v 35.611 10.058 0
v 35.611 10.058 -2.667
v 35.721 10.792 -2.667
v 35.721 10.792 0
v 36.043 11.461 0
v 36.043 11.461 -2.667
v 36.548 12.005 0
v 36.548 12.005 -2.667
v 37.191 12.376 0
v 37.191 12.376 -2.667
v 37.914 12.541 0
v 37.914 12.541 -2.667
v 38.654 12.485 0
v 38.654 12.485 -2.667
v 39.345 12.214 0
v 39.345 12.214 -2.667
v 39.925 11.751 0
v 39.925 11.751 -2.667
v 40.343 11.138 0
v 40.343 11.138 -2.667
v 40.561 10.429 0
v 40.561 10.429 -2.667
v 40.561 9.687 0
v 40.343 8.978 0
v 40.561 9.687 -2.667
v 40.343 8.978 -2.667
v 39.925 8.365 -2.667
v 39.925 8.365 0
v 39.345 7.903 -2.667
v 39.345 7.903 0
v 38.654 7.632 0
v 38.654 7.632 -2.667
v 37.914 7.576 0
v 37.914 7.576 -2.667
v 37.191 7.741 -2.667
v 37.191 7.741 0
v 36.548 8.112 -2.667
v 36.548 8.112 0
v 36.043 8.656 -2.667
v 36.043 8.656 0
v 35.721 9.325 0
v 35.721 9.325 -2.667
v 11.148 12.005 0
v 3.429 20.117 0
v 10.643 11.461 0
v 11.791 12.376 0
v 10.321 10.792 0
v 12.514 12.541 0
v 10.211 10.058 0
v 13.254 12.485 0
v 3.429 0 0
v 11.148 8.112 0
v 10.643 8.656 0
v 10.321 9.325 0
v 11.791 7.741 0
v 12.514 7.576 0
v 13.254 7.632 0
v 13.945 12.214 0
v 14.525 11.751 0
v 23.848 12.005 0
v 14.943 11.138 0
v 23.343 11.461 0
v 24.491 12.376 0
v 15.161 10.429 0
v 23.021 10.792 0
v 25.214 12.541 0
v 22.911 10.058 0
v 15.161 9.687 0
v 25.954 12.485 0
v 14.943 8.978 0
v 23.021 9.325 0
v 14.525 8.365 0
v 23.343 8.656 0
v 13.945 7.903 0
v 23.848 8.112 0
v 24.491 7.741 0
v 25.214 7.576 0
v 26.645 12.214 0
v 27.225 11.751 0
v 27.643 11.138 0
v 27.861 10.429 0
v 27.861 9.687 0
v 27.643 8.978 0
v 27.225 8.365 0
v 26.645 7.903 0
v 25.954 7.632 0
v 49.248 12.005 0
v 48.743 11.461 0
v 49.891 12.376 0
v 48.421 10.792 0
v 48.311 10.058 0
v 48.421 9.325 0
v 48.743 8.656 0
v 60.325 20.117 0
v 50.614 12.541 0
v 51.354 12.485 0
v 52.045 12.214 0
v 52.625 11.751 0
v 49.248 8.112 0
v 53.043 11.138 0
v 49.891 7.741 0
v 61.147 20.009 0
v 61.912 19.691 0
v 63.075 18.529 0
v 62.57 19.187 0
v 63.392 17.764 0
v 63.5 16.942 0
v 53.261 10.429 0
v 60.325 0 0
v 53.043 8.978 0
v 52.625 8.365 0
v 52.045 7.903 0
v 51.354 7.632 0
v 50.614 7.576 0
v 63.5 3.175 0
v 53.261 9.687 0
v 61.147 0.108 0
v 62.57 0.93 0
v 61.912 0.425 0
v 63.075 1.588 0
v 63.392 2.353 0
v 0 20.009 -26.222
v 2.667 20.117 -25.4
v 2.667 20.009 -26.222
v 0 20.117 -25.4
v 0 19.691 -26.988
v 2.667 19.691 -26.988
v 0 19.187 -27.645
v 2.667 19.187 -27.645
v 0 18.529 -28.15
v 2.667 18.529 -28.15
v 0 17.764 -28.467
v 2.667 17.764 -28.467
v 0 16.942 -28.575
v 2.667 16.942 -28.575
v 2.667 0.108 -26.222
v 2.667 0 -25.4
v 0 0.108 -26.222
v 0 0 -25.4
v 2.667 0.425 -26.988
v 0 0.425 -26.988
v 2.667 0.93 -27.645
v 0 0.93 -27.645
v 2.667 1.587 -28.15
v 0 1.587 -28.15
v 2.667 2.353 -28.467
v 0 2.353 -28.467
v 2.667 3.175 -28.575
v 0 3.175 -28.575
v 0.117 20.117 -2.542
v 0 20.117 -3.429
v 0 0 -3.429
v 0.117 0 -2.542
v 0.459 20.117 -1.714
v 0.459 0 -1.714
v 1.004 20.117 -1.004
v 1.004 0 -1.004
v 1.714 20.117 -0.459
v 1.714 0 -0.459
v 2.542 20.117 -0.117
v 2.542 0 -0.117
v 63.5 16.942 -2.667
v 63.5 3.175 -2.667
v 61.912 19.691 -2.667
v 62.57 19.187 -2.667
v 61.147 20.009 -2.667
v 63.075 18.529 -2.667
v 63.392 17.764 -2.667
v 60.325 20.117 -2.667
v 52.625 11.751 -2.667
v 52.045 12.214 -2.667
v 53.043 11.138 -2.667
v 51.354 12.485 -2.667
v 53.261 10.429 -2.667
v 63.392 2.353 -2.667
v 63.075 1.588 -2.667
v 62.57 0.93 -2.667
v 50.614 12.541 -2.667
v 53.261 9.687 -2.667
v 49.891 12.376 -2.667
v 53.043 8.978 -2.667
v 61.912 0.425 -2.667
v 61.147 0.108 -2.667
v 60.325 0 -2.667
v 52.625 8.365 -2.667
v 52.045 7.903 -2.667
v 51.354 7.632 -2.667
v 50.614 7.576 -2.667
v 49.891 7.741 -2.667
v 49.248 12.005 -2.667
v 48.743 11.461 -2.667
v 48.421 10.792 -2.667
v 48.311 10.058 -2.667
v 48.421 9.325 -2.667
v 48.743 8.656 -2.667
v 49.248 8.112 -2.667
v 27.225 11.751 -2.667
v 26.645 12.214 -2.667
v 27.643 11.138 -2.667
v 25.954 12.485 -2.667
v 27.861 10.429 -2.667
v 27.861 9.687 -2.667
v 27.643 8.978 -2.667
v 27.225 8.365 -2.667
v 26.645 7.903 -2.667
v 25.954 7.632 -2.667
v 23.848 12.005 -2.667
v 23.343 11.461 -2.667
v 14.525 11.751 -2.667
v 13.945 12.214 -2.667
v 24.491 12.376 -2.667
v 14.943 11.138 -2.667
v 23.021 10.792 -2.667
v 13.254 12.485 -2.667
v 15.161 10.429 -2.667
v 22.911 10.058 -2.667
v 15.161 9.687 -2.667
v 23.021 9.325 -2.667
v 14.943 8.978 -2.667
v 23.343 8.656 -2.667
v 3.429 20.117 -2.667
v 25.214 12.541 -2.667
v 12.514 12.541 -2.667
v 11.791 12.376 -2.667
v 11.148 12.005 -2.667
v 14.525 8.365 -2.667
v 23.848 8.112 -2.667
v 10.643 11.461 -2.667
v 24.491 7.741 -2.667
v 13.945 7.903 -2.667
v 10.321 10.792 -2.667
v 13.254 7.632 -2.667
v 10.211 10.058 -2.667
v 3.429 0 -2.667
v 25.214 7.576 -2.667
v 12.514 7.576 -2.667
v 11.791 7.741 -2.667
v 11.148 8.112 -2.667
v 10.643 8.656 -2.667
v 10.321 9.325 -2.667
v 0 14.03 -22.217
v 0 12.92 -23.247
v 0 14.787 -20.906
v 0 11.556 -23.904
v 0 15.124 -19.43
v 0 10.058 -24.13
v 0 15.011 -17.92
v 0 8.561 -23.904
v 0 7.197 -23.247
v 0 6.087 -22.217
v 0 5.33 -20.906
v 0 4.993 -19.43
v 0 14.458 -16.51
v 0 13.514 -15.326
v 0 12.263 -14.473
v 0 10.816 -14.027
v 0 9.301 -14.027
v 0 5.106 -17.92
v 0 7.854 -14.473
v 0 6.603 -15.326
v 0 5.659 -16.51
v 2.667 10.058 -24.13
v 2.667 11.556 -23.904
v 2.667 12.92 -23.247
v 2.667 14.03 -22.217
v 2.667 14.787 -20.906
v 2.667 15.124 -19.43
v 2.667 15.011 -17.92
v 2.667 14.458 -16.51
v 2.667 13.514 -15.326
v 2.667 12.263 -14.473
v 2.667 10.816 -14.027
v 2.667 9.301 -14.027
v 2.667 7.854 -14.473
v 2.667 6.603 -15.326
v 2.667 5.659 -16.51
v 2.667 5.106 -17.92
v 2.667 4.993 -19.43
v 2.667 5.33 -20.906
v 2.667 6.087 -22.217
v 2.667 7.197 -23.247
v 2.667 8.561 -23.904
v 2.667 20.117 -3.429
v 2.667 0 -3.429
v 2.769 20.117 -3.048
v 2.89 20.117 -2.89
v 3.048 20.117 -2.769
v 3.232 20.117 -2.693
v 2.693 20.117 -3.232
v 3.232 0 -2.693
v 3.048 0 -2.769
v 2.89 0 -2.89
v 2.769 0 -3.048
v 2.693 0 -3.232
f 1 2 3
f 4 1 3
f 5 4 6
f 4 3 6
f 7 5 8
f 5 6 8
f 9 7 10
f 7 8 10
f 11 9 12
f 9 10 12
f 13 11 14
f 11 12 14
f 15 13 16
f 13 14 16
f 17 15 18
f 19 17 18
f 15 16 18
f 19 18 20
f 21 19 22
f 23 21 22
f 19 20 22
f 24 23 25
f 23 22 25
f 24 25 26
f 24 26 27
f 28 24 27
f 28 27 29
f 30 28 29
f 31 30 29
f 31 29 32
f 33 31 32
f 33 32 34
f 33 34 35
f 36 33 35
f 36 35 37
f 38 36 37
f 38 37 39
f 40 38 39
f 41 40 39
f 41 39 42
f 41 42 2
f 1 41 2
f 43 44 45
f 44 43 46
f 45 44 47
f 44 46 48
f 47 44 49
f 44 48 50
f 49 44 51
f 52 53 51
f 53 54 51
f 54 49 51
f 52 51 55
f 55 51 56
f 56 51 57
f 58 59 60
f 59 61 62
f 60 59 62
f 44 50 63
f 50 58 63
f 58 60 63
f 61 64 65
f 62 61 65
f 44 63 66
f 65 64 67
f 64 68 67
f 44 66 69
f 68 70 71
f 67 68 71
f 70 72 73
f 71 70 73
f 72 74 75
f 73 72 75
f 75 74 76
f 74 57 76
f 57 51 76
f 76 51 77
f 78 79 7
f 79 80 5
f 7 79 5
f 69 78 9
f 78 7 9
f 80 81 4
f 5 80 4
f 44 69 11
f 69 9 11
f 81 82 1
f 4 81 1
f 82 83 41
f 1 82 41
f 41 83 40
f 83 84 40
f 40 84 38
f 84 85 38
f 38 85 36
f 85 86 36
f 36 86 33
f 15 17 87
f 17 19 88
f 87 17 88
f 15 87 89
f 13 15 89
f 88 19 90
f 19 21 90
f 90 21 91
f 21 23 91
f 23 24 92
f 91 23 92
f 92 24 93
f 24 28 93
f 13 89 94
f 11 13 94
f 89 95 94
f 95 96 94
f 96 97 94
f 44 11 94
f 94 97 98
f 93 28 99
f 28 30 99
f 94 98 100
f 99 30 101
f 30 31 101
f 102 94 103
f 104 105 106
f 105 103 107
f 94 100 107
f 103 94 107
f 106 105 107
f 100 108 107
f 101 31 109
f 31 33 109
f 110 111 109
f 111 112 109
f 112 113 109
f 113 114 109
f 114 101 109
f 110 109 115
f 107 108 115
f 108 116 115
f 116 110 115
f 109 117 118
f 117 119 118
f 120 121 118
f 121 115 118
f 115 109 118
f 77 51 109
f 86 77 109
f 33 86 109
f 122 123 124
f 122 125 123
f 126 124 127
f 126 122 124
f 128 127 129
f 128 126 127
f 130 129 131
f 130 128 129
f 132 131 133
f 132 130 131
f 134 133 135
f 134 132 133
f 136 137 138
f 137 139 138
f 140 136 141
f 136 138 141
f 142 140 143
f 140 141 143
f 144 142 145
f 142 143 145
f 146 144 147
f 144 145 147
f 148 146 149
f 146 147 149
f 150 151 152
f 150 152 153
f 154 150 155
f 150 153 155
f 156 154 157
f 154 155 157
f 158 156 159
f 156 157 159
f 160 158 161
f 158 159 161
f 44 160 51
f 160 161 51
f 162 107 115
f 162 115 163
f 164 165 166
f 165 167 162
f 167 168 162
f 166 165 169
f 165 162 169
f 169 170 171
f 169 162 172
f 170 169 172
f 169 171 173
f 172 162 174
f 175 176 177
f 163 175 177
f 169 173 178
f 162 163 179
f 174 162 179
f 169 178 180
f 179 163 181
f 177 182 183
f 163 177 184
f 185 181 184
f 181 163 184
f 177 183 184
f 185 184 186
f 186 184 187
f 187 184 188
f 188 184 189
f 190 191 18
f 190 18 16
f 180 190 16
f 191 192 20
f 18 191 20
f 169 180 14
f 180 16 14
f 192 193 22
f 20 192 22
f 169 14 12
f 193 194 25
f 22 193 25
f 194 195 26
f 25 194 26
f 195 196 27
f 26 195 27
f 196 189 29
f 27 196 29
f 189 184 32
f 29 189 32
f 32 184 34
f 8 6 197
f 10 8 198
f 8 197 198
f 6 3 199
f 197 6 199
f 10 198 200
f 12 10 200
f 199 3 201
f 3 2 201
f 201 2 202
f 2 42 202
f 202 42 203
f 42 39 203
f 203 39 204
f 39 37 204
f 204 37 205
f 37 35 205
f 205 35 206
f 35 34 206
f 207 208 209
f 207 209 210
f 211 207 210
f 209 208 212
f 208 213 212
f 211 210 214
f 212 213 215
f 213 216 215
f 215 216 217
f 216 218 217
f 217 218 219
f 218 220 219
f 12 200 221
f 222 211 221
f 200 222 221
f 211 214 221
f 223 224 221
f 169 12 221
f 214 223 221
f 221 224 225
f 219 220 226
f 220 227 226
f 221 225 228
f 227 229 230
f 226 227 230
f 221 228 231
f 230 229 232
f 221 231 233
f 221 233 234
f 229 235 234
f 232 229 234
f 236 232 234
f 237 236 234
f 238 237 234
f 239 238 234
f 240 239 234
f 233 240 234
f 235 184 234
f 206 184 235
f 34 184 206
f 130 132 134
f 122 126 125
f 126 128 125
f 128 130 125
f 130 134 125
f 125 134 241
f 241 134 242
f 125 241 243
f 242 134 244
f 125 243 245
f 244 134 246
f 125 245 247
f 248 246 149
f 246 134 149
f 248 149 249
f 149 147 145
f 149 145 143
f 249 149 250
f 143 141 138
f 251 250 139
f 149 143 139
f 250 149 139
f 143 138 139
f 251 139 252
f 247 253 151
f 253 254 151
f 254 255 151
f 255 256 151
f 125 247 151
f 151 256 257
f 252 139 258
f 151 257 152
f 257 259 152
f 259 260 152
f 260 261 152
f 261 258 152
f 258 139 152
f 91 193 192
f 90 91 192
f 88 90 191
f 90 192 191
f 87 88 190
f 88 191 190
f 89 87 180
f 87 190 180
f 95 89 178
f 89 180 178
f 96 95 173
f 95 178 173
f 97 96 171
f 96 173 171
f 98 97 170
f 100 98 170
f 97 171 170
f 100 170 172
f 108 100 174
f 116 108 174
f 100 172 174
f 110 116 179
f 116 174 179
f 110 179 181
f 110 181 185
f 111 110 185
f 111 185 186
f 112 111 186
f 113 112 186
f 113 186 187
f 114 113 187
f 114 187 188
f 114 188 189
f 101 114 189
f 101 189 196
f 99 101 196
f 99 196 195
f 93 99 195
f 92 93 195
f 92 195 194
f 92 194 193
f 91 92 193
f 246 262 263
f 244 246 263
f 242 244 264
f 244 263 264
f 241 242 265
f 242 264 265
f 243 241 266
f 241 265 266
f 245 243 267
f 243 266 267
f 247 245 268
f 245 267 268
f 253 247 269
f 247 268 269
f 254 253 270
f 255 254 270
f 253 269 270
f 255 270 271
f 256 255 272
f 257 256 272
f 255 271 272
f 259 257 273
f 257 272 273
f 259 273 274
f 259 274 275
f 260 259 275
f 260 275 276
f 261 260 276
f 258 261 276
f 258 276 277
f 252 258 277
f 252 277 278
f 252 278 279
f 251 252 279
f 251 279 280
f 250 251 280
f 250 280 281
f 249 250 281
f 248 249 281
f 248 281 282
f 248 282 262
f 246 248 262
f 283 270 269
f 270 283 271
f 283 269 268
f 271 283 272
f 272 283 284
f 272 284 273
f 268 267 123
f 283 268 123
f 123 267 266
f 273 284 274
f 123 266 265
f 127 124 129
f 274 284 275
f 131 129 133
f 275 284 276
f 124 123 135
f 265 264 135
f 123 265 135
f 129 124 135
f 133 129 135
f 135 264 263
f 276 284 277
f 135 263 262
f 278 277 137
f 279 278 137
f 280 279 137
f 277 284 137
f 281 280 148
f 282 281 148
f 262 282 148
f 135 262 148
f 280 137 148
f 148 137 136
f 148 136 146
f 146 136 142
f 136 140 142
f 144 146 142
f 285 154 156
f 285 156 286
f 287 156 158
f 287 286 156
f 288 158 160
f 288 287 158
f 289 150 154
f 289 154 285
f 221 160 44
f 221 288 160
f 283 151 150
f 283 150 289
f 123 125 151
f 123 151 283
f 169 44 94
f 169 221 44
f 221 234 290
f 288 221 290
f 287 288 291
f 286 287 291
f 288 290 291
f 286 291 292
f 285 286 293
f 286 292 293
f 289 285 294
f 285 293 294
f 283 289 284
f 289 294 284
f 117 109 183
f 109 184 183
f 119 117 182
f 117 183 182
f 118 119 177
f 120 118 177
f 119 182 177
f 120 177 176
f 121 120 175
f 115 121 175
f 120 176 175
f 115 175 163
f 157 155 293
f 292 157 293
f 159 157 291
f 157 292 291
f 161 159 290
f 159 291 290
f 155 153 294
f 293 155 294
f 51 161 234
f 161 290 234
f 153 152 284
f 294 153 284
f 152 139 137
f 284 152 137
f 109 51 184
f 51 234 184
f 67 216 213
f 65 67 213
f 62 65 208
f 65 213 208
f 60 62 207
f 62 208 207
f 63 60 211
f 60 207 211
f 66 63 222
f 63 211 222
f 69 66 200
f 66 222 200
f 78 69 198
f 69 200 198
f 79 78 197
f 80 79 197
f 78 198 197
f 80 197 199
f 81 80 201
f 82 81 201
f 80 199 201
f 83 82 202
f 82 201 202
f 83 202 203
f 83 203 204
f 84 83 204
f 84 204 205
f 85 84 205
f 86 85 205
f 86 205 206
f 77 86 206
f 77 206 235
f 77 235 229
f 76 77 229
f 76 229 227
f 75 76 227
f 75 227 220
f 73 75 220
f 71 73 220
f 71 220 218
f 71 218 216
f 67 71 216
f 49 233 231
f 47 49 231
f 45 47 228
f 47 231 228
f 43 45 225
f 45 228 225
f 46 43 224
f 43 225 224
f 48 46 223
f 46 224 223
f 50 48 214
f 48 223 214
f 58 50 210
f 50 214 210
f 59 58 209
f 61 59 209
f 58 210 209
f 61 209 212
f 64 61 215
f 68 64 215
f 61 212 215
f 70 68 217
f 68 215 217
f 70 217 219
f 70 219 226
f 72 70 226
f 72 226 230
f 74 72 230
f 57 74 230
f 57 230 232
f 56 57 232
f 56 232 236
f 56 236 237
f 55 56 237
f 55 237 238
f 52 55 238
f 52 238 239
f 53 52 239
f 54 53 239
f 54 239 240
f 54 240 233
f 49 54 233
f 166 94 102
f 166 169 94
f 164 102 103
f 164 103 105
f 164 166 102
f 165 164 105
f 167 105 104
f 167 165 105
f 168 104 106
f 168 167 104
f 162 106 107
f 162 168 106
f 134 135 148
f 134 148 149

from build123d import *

# Parameters (mm, degrees)
BASE_FLANGE1_DEPTH = 20.1168
SKETCH6_R          = 2.4892
CUT_EXTRUDE1_DEPTH = 72.471393622
SKETCH7_R          = 5.08
CUT_EXTRUDE2_DEPTH = 71.156041481
FILLET1_R          = 3.175


# Read off the part's stored shape, not the designer's step: Base-Flange1
with BuildPart() as part:
    # Base-Flange1 outline → Base-Flange1 (new body)
    with BuildSketch(Plane(origin=(0, 0, 0), x_dir=(1, 0, 0), z_dir=(0, 1, 0))):
        with BuildLine():
            Line((3.429, 0), (63.5, 0))
            Line((63.5, 0), (63.5, 2.667))
            Line((63.5, 2.667), (3.429, 2.667))
            ThreePointArc((3.429, 2.667), (2.890184633, 2.890184633), (2.667, 3.429))
            Line((2.667, 3.429), (2.667, 28.575))
            Line((2.667, 28.575), (0, 28.575))
            Line((0, 28.575), (0, 3.429))
            ThreePointArc((0, 3.429), (1.004330847, 1.004330847), (3.429, 0))
        make_face()
    extrude(amount=BASE_FLANGE1_DEPTH)

    # Sketch6 → Cut-Extrude1 (cut, through all)
    with BuildSketch(Plane(origin=(0, 0, -2.667), x_dir=(-1, 0, 0), z_dir=(0, 0, -1))):
        with Locations((-50.8, 10.0584)):
            Circle(SKETCH6_R)
        with Locations((-38.1, 10.0584)):
            Circle(SKETCH6_R)
        with Locations((-25.4, 10.0584)):
            Circle(SKETCH6_R)
        with Locations((-12.7, 10.0584)):
            Circle(SKETCH6_R)
    extrude(amount=-CUT_EXTRUDE1_DEPTH, mode=Mode.SUBTRACT)

    # Sketch7 → Cut-Extrude2 (cut, through all)
    with BuildSketch(Plane(origin=(2.667, 0, 0), x_dir=(0, 0, -1), z_dir=(1, 0, 0))):
        with Locations((19.05, 10.0584)):
            Circle(SKETCH7_R)
    extrude(amount=-CUT_EXTRUDE2_DEPTH, mode=Mode.SUBTRACT)

    # Fillet1
    fillet1_edges = [part.edges().sort_by_distance(p)[0] for p in [
        (1.3335, 20.1168, -28.575),
        (1.3335, 0, -28.575),
        (63.5, 20.1168, -1.3335),
        (63.5, 0, -1.3335),
    ]]
    fillet(fillet1_edges, radius=FILLET1_R)


solid = part.part
